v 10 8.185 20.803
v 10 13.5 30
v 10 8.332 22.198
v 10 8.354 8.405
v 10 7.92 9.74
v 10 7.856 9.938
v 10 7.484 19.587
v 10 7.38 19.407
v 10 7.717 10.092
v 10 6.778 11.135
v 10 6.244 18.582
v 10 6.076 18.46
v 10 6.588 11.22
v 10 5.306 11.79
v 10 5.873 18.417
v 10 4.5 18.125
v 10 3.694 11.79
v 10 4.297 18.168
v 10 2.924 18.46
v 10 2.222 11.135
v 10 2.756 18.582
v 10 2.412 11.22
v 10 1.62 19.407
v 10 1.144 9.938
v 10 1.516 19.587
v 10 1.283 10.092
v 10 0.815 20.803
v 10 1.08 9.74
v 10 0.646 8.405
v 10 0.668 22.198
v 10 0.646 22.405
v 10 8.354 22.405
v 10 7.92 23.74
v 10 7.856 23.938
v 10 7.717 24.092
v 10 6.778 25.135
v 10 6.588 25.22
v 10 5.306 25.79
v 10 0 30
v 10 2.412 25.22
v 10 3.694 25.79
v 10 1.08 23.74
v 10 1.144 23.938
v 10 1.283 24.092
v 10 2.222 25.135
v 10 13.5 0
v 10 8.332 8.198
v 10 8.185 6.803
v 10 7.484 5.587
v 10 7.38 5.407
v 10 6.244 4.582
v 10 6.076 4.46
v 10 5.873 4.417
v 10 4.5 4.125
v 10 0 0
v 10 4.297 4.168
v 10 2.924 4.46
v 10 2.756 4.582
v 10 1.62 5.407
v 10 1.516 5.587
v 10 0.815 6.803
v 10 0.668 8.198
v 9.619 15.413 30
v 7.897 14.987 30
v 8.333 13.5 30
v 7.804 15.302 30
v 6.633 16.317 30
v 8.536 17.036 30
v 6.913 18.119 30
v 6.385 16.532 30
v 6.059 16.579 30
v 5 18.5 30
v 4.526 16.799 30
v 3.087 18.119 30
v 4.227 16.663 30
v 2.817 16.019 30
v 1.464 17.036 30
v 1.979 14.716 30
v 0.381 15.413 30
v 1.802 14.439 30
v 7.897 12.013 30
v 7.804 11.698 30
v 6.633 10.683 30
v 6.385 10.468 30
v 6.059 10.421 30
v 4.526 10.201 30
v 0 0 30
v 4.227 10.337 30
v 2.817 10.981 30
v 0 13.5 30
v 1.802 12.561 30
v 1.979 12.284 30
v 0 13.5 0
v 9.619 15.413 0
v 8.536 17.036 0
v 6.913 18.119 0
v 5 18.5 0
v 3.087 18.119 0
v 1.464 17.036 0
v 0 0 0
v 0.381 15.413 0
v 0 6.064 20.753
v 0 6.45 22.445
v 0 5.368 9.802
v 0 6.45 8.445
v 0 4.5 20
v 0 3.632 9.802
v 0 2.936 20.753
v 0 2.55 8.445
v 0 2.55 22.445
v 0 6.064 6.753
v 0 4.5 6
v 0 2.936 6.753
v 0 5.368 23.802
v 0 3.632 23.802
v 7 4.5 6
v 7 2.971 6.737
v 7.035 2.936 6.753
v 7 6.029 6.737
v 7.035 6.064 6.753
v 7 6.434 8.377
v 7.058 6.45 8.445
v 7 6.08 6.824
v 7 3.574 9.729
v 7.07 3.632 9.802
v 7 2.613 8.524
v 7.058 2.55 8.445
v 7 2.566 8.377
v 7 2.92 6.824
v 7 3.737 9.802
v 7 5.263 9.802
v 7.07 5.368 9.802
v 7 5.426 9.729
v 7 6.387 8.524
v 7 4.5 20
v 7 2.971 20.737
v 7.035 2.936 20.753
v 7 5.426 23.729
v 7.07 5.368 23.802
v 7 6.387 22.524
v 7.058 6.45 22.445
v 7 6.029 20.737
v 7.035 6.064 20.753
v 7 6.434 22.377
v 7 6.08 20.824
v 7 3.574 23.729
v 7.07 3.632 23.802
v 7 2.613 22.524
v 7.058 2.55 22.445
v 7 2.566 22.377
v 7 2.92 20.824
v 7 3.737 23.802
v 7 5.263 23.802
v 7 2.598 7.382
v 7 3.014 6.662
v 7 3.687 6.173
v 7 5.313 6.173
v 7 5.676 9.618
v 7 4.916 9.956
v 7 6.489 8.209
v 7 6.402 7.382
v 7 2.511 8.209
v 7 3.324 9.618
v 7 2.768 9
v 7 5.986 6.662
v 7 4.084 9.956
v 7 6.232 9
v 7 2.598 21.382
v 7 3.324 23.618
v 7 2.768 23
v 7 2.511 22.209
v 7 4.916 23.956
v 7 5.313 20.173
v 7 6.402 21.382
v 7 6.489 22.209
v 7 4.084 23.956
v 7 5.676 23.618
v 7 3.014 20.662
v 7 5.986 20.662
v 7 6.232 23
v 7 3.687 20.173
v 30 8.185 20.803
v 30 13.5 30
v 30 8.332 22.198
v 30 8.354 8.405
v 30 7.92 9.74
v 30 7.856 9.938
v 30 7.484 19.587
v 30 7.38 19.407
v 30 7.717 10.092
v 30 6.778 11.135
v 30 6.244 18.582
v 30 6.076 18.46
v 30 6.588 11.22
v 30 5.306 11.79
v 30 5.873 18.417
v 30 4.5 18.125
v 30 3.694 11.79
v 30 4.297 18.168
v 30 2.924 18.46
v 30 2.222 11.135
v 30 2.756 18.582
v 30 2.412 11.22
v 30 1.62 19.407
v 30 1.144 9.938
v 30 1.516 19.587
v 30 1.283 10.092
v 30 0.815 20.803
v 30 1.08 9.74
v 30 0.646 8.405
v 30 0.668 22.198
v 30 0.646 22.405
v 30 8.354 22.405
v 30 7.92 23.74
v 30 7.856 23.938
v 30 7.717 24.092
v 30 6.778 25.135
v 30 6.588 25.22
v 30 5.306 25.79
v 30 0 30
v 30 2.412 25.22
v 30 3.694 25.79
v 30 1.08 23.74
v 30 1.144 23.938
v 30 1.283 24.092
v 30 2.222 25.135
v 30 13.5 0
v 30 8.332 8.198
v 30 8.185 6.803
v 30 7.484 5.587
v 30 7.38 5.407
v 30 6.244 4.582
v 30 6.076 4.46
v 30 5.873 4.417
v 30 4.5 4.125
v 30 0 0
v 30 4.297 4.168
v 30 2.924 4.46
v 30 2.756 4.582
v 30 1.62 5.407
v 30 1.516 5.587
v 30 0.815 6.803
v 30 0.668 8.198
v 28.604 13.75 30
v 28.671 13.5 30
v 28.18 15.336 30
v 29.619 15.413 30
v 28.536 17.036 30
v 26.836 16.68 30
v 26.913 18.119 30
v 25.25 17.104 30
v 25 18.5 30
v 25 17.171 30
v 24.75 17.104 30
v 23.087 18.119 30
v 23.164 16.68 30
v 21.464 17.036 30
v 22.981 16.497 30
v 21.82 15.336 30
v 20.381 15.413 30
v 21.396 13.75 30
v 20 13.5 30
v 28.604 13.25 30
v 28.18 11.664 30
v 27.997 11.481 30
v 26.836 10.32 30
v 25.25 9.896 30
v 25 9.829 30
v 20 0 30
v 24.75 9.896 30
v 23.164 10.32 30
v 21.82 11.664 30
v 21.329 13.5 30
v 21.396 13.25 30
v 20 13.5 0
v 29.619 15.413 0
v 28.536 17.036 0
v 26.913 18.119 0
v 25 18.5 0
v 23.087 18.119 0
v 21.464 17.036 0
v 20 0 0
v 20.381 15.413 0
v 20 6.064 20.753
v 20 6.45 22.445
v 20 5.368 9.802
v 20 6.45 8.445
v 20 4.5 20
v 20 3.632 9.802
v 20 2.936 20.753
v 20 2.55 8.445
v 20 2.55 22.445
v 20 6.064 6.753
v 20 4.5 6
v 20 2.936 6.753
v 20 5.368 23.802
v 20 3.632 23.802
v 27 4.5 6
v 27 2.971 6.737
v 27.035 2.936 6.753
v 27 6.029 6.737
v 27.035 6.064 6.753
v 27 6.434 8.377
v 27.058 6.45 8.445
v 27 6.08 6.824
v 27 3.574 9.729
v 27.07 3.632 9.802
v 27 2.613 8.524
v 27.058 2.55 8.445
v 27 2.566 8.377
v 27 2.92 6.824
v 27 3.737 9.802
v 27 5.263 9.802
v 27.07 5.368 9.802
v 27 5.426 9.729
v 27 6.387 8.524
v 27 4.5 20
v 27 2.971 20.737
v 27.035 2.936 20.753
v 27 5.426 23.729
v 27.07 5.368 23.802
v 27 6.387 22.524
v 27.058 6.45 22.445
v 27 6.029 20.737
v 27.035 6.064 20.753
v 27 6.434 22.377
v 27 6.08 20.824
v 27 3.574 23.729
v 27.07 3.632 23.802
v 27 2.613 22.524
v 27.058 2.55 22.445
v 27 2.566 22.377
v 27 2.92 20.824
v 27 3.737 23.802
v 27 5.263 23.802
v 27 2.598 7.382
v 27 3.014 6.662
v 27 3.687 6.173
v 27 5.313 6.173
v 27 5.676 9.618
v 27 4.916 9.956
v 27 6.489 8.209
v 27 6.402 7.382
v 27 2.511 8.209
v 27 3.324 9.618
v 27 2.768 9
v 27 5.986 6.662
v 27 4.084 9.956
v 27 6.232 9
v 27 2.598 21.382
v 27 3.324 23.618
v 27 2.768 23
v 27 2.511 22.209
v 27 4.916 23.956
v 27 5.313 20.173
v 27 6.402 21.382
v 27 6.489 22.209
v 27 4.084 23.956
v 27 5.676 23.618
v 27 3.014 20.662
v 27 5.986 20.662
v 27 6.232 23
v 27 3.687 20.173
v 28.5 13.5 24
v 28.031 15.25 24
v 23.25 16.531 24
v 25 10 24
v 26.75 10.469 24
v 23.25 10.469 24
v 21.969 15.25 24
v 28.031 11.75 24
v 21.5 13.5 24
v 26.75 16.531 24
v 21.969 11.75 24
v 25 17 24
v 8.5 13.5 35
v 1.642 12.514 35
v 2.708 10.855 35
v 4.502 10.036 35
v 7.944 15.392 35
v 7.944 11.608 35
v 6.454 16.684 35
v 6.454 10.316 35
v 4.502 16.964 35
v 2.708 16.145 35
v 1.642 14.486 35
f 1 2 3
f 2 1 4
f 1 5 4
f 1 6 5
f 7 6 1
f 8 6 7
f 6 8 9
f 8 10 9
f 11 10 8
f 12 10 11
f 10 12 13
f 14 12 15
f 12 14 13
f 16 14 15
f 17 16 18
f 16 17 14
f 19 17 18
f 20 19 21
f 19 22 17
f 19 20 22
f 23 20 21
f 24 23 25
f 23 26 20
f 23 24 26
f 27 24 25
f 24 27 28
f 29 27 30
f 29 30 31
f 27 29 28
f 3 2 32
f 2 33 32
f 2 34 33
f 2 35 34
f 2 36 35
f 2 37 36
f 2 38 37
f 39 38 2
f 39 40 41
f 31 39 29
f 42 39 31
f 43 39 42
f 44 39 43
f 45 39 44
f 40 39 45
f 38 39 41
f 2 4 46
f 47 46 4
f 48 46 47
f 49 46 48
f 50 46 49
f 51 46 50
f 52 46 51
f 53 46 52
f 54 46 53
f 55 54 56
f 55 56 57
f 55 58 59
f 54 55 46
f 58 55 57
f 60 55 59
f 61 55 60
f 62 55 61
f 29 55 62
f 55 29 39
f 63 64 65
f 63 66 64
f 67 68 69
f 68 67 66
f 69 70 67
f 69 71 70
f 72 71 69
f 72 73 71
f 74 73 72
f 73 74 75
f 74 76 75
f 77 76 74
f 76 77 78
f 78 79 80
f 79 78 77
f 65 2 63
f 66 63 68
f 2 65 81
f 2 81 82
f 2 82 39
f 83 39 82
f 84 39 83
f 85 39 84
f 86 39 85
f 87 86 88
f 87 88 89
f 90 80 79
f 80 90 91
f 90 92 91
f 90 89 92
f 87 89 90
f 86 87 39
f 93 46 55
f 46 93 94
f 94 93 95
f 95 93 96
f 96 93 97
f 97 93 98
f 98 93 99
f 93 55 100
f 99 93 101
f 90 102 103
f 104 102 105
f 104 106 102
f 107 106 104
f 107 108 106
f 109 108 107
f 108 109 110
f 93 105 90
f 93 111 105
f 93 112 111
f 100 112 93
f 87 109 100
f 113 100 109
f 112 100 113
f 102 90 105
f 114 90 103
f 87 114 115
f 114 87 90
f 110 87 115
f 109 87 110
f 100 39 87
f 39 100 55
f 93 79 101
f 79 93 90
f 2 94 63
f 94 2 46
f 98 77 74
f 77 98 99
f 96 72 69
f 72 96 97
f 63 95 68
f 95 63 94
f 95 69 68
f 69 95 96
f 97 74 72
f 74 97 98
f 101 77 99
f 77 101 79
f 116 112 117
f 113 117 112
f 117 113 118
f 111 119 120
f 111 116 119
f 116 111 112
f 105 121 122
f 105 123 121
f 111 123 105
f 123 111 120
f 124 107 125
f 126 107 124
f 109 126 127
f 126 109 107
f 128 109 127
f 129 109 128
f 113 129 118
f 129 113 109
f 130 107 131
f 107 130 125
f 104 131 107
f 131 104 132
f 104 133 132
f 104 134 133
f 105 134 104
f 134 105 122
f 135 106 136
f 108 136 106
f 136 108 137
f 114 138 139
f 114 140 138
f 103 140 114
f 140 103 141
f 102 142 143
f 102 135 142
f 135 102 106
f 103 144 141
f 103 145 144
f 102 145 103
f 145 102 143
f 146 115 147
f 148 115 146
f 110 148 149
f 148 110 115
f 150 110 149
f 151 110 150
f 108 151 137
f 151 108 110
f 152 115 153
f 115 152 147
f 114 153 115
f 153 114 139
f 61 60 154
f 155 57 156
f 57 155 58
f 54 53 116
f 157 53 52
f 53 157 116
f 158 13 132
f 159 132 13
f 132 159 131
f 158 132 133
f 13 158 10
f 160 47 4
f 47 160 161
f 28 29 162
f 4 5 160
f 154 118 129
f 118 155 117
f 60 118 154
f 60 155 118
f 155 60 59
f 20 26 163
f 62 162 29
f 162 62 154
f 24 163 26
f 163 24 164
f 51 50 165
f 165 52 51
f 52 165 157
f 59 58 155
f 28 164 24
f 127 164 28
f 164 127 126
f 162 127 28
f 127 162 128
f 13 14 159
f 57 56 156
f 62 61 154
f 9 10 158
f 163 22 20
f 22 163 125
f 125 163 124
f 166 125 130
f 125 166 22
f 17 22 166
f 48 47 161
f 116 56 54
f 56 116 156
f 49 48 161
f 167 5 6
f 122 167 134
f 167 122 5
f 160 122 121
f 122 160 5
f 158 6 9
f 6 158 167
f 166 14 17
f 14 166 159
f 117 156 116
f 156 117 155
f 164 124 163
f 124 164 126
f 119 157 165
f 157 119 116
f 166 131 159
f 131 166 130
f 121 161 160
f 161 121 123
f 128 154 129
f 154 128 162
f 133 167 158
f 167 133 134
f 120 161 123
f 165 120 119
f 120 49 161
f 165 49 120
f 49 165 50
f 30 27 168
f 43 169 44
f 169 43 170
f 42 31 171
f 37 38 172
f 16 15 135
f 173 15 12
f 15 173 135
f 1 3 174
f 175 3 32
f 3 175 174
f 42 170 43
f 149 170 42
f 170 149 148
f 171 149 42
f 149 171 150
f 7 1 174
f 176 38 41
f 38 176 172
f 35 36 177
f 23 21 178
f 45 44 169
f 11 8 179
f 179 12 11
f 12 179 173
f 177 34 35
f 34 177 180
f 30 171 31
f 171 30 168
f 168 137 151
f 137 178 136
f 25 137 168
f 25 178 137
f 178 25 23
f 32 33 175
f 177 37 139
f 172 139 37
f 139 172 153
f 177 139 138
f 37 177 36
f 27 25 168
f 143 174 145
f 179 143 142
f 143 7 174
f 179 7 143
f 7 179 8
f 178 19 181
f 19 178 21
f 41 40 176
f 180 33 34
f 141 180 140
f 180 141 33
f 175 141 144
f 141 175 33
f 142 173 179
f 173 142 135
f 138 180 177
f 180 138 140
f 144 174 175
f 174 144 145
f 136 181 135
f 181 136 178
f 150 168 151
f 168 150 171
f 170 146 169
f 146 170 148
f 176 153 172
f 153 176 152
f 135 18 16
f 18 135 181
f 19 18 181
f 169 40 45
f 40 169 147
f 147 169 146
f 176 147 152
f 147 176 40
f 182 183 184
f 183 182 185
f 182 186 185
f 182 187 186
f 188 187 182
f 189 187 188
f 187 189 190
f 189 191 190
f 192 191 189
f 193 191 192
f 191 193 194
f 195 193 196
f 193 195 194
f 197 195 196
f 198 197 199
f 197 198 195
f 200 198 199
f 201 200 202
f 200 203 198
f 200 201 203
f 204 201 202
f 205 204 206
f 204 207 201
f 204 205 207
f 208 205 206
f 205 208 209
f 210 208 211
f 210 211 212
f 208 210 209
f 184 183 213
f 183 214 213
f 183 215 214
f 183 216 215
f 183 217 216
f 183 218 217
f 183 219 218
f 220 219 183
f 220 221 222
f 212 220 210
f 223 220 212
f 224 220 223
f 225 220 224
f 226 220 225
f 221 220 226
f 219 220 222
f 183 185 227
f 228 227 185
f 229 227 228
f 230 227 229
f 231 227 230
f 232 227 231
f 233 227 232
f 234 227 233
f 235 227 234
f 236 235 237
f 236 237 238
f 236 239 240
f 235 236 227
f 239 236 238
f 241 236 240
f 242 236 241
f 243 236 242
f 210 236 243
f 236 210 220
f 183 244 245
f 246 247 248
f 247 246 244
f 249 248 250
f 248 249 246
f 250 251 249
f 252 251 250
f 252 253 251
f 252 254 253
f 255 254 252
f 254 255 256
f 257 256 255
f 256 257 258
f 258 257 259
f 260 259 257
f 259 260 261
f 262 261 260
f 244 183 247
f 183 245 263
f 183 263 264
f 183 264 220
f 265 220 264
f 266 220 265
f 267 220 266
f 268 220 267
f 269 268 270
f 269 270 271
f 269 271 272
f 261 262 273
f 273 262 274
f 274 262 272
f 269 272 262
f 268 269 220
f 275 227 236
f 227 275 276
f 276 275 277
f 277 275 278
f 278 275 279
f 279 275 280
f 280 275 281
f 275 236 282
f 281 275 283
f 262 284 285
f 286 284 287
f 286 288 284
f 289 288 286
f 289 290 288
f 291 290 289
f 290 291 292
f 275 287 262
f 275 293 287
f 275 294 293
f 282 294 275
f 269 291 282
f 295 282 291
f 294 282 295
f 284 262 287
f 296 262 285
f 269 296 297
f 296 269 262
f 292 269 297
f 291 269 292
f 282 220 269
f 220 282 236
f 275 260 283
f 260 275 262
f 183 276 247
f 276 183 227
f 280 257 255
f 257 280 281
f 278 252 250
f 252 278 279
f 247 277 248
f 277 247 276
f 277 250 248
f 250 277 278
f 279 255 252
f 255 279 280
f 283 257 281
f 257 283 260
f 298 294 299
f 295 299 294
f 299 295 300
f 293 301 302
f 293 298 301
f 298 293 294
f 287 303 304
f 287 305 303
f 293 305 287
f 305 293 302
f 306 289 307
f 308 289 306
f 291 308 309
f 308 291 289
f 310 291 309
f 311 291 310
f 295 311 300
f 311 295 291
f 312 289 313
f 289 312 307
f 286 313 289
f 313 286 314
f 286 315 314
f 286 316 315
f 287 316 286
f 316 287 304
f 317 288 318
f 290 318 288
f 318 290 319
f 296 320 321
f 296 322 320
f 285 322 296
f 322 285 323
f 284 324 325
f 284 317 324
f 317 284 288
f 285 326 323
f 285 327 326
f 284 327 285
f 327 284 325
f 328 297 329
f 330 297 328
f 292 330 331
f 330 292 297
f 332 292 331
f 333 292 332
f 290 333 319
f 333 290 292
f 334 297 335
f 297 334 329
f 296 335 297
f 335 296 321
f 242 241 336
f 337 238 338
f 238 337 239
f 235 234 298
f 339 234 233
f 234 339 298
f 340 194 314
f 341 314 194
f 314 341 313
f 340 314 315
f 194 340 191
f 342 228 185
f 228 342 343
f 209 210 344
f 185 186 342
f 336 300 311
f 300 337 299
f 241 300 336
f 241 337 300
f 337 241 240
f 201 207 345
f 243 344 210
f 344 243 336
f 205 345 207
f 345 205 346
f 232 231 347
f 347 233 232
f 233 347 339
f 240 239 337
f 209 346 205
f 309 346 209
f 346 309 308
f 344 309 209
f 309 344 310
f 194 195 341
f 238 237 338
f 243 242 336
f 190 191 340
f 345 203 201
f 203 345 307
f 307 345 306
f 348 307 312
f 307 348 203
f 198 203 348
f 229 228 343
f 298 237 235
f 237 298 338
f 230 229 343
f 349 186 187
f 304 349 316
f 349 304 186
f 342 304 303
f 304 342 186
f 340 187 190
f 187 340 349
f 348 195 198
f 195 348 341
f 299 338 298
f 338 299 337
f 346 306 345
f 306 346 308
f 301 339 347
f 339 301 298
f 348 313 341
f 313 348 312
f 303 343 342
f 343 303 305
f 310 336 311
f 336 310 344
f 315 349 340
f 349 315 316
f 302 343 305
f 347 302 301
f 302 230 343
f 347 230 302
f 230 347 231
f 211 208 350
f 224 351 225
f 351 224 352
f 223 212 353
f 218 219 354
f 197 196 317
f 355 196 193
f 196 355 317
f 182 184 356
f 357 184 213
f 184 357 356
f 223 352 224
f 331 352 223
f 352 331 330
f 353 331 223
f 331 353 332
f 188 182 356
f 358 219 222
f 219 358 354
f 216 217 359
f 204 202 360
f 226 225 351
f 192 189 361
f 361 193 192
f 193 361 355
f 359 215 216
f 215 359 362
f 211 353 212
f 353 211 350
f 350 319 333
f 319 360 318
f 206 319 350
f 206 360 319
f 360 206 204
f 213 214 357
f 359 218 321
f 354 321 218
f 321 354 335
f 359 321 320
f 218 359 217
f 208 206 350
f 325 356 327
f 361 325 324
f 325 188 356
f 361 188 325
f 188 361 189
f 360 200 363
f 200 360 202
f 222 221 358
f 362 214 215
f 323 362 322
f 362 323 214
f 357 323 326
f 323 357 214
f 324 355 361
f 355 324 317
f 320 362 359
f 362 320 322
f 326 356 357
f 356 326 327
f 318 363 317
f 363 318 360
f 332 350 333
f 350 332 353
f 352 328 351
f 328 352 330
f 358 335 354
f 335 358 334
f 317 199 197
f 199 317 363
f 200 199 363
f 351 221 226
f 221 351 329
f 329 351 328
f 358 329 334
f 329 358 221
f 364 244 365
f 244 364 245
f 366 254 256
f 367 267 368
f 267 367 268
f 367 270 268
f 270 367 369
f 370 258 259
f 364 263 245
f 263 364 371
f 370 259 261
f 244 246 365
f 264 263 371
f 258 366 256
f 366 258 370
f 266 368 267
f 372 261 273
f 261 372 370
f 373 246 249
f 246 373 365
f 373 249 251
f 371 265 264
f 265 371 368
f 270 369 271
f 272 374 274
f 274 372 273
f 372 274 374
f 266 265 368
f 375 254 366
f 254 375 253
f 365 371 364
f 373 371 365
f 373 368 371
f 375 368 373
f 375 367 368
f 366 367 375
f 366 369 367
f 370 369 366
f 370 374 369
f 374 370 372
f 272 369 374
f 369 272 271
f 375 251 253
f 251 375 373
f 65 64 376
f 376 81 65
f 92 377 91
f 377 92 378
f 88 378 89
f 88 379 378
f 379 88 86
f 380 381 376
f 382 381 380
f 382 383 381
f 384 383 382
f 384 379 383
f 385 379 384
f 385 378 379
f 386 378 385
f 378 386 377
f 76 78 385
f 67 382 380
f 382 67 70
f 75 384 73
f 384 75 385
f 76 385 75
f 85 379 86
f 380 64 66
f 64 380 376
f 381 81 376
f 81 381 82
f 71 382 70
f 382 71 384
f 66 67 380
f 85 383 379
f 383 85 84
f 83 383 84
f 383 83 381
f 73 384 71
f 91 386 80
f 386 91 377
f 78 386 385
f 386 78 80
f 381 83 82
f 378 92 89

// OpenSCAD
wood_thickness = 9;  // base for sizes is the wood thickness

hinge_depth = 30;  // actually the length of the body
hinge_height = wood_thickness * 1.5;  // * 1.0 for just folding or * 1.5 for folding over 
hinge_width = 10;  // thickness
penis_dia = 7;
penis_length = 5;
penis_clearance = 0.4;  // Try this out, see if it fits. 

hole_from_side = 8;
hole_from_bottom = wood_thickness / 2;
hole_dia = 4;
hole_dia_outer = 9;
hole_distance_to_outer = 3;  // distance from outer to narrow part

left_or_right = 1;  // 0 for tapped hole on one side, 1 for other side

module hinge_body() {
	cube([hinge_width, hinge_height, hinge_depth]);

	translate([hinge_width/2,hinge_height,0])
	cylinder(hinge_depth, hinge_width/2, hinge_width/2, [0,0,0]);
}

module hinge_body_holes() {
	difference() {
	   	hinge_body();
		translate([-1, hole_from_bottom, hole_from_side])
			rotate([0,90,0])
				cylinder(hinge_width+2, hole_dia/2, hole_dia/2);
		translate([-1, hole_from_bottom, hinge_depth-hole_from_side])
			rotate([0,90,0])
				cylinder(hinge_width+2, hole_dia/2, hole_dia/2);
	}
}

module hinge_body_tapped_holes1() {
	difference() {
		hinge_body_holes();
		translate([-1, hole_from_bottom, hole_from_side])
			rotate([0,90,0])
				cylinder(hole_distance_to_outer+1, hole_dia_outer/2, hole_dia/2);
		translate([-1, hole_from_bottom, hinge_depth-hole_from_side])
			rotate([0,90,0])
				cylinder(hole_distance_to_outer+1, hole_dia_outer/2, hole_dia/2);
	}
}

module hinge_body_tapped_holes2() {
	difference() {
		hinge_body_holes();
		translate([hinge_width-hole_distance_to_outer, hole_from_bottom, hole_from_side])
			rotate([0,90,0])
				cylinder(hole_distance_to_outer+1, hole_dia/2, hole_dia_outer/2);
		translate([hinge_width-hole_distance_to_outer, hole_from_bottom, hinge_depth-hole_from_side])
			rotate([0,90,0])
				cylinder(hole_distance_to_outer+1, hole_dia/2, hole_dia_outer/2);
	}
}

// male
if (left_or_right == 0) {
    hinge_body_tapped_holes1();
} else {
    hinge_body_tapped_holes2();
}
translate([hinge_width/2,hinge_height,hinge_depth-1])
cylinder(penis_length+1, (penis_dia-penis_clearance)/2, penis_dia/2, [0,0,0]);

// female
translate([2*hinge_width,0,0]) {
	difference() {
		if (left_or_right == 0) {
    			hinge_body_tapped_holes1();
		} else {
    			hinge_body_tapped_holes2();
		}
		translate([hinge_width/2,hinge_height,hinge_depth-penis_length-1])
			cylinder(penis_length+2, penis_dia/2, (penis_dia+penis_clearance)/2, [0,0,0]);
	}
}
